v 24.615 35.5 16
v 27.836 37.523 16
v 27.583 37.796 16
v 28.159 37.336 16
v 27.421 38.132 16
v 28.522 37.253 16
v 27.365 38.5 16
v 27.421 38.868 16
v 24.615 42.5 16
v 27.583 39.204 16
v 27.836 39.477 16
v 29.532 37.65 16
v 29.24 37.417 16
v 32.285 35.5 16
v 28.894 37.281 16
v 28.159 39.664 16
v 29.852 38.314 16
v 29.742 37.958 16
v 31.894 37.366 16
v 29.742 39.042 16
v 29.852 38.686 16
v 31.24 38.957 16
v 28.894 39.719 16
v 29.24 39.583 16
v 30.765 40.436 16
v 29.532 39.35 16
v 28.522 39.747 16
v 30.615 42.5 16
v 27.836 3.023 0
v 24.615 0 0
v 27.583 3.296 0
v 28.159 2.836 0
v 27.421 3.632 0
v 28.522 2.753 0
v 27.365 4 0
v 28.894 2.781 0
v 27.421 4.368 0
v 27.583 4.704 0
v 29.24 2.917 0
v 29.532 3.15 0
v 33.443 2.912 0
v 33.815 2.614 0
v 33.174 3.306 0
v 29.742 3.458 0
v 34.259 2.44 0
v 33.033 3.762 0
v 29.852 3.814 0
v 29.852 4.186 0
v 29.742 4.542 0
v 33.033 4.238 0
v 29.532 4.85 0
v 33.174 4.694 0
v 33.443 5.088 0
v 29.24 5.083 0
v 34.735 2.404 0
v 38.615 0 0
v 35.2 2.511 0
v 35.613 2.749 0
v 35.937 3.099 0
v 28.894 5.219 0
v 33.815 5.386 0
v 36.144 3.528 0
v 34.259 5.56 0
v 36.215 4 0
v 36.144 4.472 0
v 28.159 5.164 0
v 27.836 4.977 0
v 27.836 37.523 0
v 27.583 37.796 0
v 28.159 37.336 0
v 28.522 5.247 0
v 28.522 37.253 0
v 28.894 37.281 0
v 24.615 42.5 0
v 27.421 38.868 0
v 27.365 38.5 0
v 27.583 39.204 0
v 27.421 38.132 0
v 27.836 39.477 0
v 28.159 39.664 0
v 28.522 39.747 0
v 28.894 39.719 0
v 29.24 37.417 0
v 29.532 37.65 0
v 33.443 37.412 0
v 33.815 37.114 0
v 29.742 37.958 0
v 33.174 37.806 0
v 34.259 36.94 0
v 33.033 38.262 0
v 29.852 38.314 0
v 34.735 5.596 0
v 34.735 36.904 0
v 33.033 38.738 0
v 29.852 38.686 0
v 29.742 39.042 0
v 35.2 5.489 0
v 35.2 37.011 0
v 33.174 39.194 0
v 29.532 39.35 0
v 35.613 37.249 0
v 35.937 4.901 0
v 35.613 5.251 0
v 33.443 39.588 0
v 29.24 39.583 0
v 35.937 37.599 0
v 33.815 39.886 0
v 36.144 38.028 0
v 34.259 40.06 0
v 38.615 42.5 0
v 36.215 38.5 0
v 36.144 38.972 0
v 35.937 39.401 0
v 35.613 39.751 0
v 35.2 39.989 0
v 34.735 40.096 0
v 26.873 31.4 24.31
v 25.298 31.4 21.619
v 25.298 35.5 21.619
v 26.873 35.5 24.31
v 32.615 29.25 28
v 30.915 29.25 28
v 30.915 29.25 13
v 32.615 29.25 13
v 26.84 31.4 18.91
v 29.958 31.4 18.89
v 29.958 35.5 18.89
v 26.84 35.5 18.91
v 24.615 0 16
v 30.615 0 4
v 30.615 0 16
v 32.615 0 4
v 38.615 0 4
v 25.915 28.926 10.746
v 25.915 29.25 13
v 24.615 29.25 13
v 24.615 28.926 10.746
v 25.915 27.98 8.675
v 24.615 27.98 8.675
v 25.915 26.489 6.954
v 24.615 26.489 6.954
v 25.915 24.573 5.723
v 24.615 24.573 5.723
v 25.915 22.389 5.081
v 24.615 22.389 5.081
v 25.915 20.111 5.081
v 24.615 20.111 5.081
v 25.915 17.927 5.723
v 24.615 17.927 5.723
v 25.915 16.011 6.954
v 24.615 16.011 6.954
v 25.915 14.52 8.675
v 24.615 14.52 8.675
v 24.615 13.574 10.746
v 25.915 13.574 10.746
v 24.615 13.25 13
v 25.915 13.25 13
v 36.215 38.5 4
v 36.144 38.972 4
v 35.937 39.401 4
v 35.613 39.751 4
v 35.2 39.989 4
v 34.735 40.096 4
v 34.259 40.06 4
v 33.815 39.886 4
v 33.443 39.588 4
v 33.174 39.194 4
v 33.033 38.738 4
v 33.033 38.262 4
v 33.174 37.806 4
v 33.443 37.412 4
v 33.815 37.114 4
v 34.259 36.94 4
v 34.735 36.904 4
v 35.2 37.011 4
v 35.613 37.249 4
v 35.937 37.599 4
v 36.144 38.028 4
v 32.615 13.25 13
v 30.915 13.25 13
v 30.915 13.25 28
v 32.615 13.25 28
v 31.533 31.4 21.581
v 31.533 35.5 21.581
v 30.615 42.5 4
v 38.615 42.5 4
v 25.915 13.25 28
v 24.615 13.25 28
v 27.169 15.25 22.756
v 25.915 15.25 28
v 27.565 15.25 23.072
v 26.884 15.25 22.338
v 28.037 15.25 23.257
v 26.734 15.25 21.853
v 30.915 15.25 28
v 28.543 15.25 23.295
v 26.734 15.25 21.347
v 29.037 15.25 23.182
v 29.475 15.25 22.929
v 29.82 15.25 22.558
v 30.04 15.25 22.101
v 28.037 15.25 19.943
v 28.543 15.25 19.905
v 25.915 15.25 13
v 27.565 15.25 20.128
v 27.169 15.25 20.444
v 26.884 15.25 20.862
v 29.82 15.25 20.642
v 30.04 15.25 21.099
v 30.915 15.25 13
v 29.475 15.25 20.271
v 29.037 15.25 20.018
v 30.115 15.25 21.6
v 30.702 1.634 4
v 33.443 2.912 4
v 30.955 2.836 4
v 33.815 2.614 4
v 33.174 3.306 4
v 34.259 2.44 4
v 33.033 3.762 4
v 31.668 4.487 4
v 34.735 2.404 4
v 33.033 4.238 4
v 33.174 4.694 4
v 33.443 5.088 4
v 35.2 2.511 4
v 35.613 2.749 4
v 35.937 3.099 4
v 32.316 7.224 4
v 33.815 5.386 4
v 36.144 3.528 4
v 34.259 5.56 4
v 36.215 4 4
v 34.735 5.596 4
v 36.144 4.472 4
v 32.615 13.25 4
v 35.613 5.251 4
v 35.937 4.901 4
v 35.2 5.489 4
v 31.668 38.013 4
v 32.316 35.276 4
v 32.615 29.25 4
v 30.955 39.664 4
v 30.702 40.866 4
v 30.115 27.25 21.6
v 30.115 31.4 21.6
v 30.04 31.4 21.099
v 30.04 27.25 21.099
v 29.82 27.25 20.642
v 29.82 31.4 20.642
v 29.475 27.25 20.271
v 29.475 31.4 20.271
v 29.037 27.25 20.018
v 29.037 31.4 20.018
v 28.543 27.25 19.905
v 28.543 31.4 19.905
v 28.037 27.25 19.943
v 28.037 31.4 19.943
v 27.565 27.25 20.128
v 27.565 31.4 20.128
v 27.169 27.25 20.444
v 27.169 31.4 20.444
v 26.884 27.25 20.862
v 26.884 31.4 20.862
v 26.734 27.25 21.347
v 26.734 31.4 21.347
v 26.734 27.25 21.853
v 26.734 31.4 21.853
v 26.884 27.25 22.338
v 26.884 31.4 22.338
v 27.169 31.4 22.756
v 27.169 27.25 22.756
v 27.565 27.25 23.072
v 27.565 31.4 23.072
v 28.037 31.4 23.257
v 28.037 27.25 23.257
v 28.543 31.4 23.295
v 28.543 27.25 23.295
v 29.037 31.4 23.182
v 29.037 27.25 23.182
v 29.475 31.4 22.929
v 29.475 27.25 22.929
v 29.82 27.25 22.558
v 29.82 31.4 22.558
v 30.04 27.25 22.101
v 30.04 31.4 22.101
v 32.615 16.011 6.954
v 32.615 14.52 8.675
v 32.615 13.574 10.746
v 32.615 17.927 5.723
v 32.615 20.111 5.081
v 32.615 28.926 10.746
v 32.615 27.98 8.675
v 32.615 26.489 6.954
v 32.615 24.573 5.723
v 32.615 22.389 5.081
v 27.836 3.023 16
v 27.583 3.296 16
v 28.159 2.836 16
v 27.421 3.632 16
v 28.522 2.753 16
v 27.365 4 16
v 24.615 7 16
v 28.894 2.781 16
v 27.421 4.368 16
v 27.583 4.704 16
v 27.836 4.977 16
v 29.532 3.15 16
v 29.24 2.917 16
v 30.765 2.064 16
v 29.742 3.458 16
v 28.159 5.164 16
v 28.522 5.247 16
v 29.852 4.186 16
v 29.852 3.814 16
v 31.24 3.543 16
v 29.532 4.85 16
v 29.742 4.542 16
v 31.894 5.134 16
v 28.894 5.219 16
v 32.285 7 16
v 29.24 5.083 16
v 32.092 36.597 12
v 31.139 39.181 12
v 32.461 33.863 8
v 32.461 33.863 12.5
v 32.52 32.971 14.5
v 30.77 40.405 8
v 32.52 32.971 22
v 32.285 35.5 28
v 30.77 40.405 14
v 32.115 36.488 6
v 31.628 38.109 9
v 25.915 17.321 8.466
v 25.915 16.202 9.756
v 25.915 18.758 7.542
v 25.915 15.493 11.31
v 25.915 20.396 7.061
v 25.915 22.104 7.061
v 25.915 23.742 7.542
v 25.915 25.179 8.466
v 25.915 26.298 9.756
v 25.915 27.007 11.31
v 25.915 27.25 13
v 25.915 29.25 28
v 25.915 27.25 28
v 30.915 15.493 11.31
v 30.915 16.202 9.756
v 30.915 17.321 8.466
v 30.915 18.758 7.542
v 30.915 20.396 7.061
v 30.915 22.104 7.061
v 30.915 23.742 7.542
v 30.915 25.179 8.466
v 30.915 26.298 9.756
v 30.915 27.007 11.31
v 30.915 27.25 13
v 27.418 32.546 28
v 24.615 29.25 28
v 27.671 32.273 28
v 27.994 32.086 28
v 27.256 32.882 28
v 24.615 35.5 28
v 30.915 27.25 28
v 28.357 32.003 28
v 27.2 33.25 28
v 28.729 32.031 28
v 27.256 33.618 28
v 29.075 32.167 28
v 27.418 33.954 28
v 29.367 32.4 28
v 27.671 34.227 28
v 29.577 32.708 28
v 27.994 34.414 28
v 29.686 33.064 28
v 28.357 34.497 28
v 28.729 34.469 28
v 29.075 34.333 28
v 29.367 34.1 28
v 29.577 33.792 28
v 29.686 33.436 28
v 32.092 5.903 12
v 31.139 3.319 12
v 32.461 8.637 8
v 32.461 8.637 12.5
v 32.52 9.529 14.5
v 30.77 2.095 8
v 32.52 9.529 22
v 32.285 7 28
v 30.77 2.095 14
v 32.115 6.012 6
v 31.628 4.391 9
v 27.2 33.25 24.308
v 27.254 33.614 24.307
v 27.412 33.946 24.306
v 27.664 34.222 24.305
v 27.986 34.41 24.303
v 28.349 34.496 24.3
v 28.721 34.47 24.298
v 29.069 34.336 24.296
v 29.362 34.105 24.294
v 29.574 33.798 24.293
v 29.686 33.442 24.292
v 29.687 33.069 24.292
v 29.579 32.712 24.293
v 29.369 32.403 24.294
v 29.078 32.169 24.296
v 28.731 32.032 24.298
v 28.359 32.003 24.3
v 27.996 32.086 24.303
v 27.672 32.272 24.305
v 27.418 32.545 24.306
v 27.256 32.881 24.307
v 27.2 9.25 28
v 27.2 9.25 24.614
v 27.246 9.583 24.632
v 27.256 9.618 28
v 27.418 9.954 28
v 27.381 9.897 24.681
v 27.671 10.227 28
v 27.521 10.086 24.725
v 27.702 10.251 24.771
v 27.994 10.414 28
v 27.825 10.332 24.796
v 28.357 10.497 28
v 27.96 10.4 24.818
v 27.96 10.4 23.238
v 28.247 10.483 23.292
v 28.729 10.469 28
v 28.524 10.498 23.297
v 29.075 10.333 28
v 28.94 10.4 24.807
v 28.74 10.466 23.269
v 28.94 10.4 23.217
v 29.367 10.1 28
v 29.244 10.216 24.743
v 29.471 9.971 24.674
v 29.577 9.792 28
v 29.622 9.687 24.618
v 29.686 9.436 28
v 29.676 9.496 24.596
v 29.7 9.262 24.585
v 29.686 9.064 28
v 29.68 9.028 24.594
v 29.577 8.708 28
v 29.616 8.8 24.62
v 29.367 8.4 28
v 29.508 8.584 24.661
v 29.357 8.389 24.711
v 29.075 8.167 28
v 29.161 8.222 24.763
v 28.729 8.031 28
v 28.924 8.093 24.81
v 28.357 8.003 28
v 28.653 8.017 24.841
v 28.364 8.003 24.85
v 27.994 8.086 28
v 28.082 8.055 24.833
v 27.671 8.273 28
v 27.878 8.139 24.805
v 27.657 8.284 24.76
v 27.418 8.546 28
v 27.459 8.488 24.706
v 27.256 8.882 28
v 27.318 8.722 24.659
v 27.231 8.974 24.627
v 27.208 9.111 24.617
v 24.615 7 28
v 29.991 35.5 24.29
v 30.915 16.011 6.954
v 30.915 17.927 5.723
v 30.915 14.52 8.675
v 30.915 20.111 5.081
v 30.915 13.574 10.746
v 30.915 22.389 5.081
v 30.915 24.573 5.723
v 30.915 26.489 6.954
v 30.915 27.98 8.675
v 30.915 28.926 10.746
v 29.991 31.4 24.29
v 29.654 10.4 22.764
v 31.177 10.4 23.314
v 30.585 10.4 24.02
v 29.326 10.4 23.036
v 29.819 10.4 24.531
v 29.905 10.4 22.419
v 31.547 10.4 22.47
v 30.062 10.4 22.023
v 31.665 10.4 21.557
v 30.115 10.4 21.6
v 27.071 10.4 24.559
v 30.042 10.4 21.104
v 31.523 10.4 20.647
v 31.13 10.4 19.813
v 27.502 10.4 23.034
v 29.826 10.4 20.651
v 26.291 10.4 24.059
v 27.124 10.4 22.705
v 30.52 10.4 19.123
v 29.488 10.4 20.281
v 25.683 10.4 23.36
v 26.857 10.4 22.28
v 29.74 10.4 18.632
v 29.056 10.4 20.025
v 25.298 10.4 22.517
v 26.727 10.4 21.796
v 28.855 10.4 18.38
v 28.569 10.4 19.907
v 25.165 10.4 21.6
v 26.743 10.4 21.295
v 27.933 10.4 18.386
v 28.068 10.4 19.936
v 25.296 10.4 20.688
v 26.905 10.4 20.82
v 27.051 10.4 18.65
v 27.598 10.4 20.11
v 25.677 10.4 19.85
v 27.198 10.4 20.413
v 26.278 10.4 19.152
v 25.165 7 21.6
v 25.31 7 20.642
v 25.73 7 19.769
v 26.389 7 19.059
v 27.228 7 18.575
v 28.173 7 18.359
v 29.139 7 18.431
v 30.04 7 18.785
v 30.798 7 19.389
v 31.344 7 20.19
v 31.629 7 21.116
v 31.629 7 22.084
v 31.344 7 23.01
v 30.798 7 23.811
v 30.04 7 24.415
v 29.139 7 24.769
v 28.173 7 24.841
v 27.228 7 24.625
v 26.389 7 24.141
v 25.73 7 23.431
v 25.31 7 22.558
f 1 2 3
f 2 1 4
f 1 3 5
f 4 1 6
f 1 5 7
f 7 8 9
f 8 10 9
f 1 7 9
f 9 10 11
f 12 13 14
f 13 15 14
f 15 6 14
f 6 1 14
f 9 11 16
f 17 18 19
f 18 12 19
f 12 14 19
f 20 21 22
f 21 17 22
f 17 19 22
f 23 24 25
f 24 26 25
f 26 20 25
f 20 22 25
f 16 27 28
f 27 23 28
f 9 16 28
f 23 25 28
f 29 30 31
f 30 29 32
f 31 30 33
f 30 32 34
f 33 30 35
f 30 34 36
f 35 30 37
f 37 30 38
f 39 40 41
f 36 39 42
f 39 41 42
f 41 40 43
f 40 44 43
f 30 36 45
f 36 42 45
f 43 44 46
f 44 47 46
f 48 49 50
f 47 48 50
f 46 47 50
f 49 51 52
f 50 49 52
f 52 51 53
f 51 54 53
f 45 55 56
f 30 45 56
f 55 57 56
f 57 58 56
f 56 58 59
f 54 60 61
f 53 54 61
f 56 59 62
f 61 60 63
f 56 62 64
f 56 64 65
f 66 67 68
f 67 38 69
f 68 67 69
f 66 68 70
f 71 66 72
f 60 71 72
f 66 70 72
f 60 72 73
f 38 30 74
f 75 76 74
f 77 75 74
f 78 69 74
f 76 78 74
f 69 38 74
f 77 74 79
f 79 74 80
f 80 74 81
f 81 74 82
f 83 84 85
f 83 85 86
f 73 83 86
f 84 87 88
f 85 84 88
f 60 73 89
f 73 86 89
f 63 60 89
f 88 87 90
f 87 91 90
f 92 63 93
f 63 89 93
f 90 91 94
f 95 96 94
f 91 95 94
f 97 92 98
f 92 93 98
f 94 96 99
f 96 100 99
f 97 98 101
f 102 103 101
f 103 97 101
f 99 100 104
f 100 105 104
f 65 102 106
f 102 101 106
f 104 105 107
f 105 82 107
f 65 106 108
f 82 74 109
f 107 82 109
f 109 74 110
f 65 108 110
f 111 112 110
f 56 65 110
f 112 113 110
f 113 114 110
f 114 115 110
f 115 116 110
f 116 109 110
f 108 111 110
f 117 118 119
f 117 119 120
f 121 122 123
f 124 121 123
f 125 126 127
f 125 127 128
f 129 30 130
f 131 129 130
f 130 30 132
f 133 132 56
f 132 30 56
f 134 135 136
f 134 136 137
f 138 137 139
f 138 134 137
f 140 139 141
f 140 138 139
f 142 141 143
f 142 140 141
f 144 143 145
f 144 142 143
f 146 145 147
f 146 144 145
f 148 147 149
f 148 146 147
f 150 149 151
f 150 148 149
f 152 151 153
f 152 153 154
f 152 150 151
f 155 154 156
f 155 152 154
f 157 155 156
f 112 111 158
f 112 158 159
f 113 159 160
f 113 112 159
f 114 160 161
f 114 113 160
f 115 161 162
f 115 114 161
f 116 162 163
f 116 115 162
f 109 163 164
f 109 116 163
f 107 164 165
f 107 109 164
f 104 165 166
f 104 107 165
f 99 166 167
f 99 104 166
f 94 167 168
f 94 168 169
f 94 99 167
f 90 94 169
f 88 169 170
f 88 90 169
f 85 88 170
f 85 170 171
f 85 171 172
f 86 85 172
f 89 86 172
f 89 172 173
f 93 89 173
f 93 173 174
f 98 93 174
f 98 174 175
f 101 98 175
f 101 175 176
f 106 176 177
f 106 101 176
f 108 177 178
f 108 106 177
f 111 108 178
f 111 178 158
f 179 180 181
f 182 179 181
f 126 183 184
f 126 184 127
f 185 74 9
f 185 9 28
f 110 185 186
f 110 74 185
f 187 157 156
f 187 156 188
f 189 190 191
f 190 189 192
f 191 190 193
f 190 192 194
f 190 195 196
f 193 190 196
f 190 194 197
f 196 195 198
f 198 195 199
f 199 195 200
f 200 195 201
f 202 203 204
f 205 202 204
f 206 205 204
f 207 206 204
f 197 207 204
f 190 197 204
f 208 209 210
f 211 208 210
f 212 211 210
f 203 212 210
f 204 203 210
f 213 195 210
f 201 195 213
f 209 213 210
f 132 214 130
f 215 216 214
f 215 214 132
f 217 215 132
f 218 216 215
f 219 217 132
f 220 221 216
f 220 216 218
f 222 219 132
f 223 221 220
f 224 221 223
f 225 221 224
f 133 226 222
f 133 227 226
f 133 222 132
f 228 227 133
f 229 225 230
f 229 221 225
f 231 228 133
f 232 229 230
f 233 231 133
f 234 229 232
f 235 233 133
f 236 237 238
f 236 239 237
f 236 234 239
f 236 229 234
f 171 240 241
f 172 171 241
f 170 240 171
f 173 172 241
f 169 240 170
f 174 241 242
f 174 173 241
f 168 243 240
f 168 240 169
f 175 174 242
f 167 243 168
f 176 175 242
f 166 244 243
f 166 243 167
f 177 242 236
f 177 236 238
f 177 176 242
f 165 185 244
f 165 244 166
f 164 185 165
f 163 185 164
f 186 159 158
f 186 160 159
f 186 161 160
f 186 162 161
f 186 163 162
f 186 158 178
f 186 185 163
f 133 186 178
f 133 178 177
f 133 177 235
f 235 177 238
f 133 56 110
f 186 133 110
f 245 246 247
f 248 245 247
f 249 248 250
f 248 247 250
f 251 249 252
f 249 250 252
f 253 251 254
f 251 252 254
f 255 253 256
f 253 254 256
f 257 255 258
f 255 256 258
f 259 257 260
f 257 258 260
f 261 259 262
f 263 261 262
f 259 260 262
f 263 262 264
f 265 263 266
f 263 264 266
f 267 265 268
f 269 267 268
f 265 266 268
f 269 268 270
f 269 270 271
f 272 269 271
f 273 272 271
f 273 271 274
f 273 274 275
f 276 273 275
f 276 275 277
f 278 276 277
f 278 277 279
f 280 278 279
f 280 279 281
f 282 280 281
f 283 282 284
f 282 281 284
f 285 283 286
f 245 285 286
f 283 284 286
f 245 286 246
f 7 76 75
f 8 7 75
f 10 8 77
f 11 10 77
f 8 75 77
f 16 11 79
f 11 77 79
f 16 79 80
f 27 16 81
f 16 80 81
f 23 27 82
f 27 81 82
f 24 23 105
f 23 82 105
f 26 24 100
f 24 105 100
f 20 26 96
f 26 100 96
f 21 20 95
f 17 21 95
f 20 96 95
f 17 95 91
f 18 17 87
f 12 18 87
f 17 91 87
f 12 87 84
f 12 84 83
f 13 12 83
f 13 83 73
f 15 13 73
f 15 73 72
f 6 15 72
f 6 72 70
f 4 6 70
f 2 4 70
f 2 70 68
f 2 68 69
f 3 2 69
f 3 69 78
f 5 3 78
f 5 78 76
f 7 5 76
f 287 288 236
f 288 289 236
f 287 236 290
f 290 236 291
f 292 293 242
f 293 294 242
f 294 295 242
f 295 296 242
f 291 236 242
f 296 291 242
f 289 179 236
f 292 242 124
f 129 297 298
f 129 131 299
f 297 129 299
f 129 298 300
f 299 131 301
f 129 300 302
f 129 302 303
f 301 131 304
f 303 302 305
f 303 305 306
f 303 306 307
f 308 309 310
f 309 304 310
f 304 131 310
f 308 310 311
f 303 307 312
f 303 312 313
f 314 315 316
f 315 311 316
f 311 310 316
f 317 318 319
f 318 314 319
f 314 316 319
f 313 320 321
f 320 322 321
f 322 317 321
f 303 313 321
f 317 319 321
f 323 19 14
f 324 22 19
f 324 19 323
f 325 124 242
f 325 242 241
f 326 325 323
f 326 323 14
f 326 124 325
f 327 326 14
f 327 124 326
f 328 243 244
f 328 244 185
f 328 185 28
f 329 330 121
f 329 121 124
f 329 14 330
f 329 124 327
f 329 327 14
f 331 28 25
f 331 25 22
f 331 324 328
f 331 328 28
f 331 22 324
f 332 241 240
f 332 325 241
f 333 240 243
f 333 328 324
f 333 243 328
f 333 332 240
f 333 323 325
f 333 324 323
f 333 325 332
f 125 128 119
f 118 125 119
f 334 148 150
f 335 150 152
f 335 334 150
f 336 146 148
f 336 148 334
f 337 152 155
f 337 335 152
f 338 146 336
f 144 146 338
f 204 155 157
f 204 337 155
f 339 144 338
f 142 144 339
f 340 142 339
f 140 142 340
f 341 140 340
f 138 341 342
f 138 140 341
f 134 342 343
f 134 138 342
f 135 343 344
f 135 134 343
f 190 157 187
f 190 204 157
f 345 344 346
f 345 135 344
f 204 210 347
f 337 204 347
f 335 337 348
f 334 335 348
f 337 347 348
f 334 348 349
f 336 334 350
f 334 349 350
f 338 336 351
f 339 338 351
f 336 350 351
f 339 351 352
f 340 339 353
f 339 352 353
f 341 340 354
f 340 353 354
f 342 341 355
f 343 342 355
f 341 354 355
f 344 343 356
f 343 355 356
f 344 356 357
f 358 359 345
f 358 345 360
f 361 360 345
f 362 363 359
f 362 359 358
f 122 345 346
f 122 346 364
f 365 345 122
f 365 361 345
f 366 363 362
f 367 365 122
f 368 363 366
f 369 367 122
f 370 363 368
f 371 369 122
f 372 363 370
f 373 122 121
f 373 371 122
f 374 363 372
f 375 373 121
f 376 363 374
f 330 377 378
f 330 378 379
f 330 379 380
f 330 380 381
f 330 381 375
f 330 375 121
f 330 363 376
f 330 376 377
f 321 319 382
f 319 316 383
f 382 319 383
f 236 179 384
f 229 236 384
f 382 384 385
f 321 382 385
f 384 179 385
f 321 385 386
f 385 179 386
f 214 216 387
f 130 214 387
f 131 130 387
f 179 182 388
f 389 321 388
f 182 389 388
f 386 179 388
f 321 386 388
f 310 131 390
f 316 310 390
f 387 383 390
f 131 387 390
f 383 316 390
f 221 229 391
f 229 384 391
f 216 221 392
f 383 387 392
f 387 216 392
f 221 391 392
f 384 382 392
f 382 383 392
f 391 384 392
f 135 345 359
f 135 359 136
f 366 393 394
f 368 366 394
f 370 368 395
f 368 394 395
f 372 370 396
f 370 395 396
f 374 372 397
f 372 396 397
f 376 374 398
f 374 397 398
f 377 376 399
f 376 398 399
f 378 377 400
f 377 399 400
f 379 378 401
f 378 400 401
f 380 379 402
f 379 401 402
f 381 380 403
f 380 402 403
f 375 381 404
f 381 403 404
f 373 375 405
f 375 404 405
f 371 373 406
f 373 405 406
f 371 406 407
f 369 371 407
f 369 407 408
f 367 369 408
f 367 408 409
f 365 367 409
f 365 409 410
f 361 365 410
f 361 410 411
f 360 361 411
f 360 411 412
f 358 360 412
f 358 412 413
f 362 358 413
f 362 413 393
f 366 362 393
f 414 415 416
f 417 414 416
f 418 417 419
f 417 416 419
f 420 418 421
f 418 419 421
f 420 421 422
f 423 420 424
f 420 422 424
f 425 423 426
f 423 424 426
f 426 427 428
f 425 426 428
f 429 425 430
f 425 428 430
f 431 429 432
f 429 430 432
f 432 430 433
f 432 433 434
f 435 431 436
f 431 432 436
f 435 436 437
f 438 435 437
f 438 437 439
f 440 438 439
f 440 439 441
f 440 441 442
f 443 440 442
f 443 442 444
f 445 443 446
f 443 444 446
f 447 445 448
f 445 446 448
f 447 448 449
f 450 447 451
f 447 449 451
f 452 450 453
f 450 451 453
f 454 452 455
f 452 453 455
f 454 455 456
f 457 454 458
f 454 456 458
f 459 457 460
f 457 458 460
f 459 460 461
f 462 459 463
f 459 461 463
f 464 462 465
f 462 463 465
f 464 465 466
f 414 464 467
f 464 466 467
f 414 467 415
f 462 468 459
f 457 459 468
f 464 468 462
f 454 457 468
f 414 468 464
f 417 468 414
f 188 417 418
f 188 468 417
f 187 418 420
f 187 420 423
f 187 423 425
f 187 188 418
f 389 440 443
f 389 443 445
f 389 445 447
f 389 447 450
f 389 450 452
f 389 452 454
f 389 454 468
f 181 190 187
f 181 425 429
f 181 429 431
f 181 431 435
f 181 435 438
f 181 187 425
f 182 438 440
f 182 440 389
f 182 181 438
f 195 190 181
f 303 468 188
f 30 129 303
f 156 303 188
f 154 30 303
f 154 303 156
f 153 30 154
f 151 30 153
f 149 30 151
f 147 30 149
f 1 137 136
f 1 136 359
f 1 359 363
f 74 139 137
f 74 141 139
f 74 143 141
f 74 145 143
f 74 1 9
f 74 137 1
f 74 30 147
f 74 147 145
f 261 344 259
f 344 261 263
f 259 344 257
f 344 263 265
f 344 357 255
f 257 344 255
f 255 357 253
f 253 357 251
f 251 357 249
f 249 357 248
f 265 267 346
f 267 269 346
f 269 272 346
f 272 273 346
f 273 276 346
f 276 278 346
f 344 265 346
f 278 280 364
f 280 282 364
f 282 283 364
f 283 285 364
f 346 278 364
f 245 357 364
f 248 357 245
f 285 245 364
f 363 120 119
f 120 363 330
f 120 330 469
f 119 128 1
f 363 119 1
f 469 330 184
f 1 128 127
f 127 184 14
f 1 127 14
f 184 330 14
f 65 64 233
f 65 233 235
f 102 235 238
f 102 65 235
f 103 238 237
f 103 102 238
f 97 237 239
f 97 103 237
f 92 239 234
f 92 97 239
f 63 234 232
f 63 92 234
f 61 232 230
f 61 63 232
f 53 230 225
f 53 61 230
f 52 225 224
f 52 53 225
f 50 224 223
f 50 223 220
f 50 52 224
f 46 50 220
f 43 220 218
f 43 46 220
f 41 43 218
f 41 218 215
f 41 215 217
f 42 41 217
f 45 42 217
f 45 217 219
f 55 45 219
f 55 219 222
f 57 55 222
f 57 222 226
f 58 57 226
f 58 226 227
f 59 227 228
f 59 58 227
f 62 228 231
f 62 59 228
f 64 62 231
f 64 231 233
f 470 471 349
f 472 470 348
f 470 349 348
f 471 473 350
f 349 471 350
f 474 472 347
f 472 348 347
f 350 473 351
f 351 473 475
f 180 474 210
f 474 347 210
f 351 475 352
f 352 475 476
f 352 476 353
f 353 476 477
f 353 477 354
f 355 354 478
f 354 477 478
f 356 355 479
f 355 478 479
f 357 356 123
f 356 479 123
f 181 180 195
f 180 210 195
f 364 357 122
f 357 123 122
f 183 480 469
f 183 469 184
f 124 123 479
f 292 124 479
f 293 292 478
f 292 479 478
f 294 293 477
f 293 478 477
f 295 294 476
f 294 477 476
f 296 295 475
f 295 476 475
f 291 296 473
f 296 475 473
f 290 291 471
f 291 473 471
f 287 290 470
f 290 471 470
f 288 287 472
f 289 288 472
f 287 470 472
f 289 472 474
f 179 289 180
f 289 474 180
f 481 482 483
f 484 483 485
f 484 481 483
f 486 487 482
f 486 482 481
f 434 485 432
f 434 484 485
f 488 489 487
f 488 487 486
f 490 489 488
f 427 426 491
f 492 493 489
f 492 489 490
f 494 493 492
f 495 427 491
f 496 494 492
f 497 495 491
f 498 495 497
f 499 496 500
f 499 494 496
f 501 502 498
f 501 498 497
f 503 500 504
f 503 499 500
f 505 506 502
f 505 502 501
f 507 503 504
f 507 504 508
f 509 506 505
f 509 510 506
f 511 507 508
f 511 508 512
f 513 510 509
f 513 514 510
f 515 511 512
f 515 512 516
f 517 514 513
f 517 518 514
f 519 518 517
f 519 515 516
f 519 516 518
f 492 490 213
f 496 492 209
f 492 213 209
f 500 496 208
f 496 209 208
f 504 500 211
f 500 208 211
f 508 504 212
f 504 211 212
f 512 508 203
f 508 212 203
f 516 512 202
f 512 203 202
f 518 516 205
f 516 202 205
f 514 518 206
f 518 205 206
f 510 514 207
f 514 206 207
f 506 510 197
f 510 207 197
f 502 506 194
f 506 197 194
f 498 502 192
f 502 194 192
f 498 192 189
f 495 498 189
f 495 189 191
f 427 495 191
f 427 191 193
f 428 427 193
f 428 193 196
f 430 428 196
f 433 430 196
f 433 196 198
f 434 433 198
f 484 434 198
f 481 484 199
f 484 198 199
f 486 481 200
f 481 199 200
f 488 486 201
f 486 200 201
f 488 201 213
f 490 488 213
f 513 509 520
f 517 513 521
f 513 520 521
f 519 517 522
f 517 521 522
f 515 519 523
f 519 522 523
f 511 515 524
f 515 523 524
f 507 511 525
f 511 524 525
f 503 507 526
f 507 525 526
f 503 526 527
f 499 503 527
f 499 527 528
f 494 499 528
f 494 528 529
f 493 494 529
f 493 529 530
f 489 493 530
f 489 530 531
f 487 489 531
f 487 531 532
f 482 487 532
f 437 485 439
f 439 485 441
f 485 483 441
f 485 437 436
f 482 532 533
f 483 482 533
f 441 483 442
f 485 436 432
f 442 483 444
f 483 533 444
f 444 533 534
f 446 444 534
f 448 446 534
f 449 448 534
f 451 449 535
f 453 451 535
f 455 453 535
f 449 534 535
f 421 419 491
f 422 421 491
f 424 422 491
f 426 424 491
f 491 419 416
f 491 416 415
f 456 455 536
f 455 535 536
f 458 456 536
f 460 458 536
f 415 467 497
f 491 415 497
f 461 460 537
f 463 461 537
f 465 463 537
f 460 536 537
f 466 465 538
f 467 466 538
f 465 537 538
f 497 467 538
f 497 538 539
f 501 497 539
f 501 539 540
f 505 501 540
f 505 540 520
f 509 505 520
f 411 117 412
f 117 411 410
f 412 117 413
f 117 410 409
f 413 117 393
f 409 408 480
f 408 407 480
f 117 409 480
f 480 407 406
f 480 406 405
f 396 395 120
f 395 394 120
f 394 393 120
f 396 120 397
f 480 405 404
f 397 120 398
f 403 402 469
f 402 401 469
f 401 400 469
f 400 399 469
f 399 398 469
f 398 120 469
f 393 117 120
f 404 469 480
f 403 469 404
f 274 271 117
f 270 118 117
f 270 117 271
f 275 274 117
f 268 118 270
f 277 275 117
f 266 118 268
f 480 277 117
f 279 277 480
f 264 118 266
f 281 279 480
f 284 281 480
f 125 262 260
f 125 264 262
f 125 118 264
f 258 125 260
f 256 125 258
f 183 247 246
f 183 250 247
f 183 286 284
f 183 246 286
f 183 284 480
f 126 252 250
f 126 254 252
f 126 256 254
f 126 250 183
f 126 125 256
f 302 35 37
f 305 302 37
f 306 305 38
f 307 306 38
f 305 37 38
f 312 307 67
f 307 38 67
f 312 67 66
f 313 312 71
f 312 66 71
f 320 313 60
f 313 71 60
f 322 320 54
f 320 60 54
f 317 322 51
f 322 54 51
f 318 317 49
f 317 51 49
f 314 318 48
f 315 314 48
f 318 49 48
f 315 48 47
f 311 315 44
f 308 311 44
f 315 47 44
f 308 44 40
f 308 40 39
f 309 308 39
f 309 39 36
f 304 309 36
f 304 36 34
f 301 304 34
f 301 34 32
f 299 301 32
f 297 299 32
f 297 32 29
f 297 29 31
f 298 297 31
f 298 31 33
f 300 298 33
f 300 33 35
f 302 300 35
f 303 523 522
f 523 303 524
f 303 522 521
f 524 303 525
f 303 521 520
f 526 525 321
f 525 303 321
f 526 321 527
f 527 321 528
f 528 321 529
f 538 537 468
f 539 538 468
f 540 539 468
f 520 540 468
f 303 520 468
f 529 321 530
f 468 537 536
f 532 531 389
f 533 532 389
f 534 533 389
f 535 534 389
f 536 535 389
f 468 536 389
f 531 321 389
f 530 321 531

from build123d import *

# Parameters (mm, degrees)
ESQUISSE1_W                                        = 14
ESQUISSE1_H                                        = 42.5
ESQUISSE1_R                                        = 1.6
BOSS_EXTRU_1_DEPTH                                 = 4
ESQUISSE2_W                                        = 8
ESQUISSE2_H                                        = 42.5
BOSS_EXTRU_2_DEPTH                                 = 24
ENL_V_MAT_EXTRU_1_DEPTH                            = 9
ENL_V_START                                        = -1.7
ENL_V_MAT_EXTRU_3_DEPTH                            = 1.7
ENL_V_START_2                                      = -1.3
ENL_V_MAT_EXTRU_4_DEPTH                            = 1.3
ESQUISSE6_W                                        = 12
ESQUISSE6_H                                        = 7
ENL_V_MAT_EXTRU_2_DEPTH                            = 9
CHAMBRAGE_POUR_VIS_T_TE_HEXAGONALE_M31_D           = 3.4
CHAMBRAGE_POUR_VIS_T_TE_HEXAGONALE_M31_DEPTH       = 30
CHAMBRAGE_POUR_VIS_T_TE_HEXAGONALE_M31_CBORE_D     = 6.5
CHAMBRAGE_POUR_VIS_T_TE_HEXAGONALE_M31_CBORE_DEPTH = 3.4
CHAMBRAGE_POUR_VIS_T_TE_HEXAGONALE_M31_TIP         = 1.021463052
TROU_POUR_TARAUDAGE_POUR_TROU_TARAUD_M3_D          = 2.5
TROU_POUR_TARAUDAGE_POUR_TROU_TARAUD_M3_DEPTH      = 34.5
ENL_V_MAT_EXTRU_5_DEPTH                            = 4.1
ENL_V_MAT_EXTRU_6_DEPTH                            = 24
TROU_POUR_TARAUDAGE_POUR_TROU_TARAUD_2_D           = 2.5
TROU_POUR_TARAUDAGE_POUR_TROU_TARAUD_2_DEPTH       = 5


with BuildPart() as part:
    # Esquisse1 → Boss.-Extru.1 (new body)
    with BuildSketch(Plane.XY):
        with Locations((31.615489842, 21.249999998)):
            Rectangle(ESQUISSE1_W, ESQUISSE1_H)
        with Locations((34.615489842, 3.999999998)):
            Circle(ESQUISSE1_R, mode=Mode.SUBTRACT)
        with Locations((34.615489842, 38.499999998)):
            Circle(ESQUISSE1_R, mode=Mode.SUBTRACT)
    extrude(amount=BOSS_EXTRU_1_DEPTH)

    # Esquisse2 → Boss.-Extru.2 (add)
    with BuildSketch(Plane.XY.offset(4)):
        with Locations((28.615489842, 21.249999998)):
            Rectangle(ESQUISSE2_W, ESQUISSE2_H)
    extrude(amount=BOSS_EXTRU_2_DEPTH)

    # Esquisse3 → Enlèv. mat.-Extru.1 (cut, through all)
    with BuildSketch(Plane(origin=(32.615489842, 0, 0), x_dir=(0, 0, -1), z_dir=(1, 0, 0))):
        with BuildLine():
            Line((-13, 27.250000778), (-28, 27.250000778))
            Line((-28, 27.250000778), (-28, 15.250000778))
            Line((-28, 15.250000778), (-13, 15.250000778))
            ThreePointArc((-13, 15.250000778), (-7, 21.250000778), (-13, 27.250000778))
        make_face()
    extrude(amount=-ENL_V_MAT_EXTRU_1_DEPTH, mode=Mode.SUBTRACT)

    # Esquisse7 → Enlèv. mat.-Extru.3 (cut)
    with BuildSketch(Plane(origin=(32.615489842, 0, 0), x_dir=(0, 0, -1), z_dir=(1, 0, 0)).offset(ENL_V_START)):
        with BuildLine():
            Line((-13, 13.250000429), (-28, 13.250000429))
            Line((-28, 13.250000429), (-28, 29.250000429))
            Line((-28, 29.250000429), (-13, 29.250000429))
            ThreePointArc((-13, 29.250000429), (-5, 21.250000429), (-13, 13.250000429))
        make_face()
    extrude(amount=ENL_V_MAT_EXTRU_3_DEPTH, mode=Mode.SUBTRACT)

    # Esquisse8 → Enlèv. mat.-Extru.4 (cut)
    with BuildSketch(Plane.ZY.offset(-24.615489842).offset(ENL_V_START_2)):
        with BuildLine():
            Line((13, 13.250000429), (28, 13.250000429))
            Line((28, 13.250000429), (28, 29.250000429))
            Line((28, 29.250000429), (13, 29.250000429))
            ThreePointArc((13, 29.250000429), (5, 21.250000429), (13, 13.250000429))
        make_face()
    extrude(amount=ENL_V_MAT_EXTRU_4_DEPTH, mode=Mode.SUBTRACT)

    # Esquisse6 → Enlèv. mat.-Extru.2 (cut, through all)
    with BuildSketch(Plane(origin=(32.615489842, 0, 0), x_dir=(0, 0, -1), z_dir=(1, 0, 0))):
        with Locations((-22, 38.999999998)):
            Rectangle(ESQUISSE6_W, ESQUISSE6_H)
        Polygon((-28, -2e-09), (-16, 0), (-16, 7), (-28, 7), align=None)
    extrude(amount=-ENL_V_MAT_EXTRU_2_DEPTH, mode=Mode.SUBTRACT)

    # Chambrage pour vis à tête hexagonale M31
    with Locations(Plane(origin=(0, 7, 0), x_dir=(-1, 0, 0), z_dir=(0, -1, 0))):
        with Locations((-28.415489842, -21.6)):
            CounterBoreHole(CHAMBRAGE_POUR_VIS_T_TE_HEXAGONALE_M31_D / 2, CHAMBRAGE_POUR_VIS_T_TE_HEXAGONALE_M31_CBORE_D / 2, CHAMBRAGE_POUR_VIS_T_TE_HEXAGONALE_M31_CBORE_DEPTH, depth=CHAMBRAGE_POUR_VIS_T_TE_HEXAGONALE_M31_DEPTH)
            with Locations((0, 0, -(CHAMBRAGE_POUR_VIS_T_TE_HEXAGONALE_M31_DEPTH + CHAMBRAGE_POUR_VIS_T_TE_HEXAGONALE_M31_TIP / 2))):  # 118° drill point
                Cone(0, CHAMBRAGE_POUR_VIS_T_TE_HEXAGONALE_M31_D / 2, CHAMBRAGE_POUR_VIS_T_TE_HEXAGONALE_M31_TIP, mode=Mode.SUBTRACT)

    # Trou pour taraudage pour trou taraud_ M3
    with Locations(Plane.XY.offset(16)):
        with Locations((28.615489842, 4), (28.615489842, 38.499999998)):
            Hole(TROU_POUR_TARAUDAGE_POUR_TROU_TARAUD_M3_D / 2, depth=TROU_POUR_TARAUDAGE_POUR_TROU_TARAUD_M3_DEPTH)

    # Esquisse15 → Enlèv. mat.-Extru.5 (cut)
    with BuildSketch(Plane(origin=(0, 35.499999998, 0), x_dir=(1, 0, 0), z_dir=(0, 1, 0))):
        Polygon((25.297858374, -21.619339993), (26.873423034, -24.309618047), (29.991054501, -24.290278053), (31.533121309, -21.580660007), (29.95755665, -18.890381953), (26.839925183, -18.909721947), align=None)
    extrude(amount=-ENL_V_MAT_EXTRU_5_DEPTH, mode=Mode.SUBTRACT)

    # Esquisse16 → Enlèv. mat.-Extru.6 (cut)
    with BuildSketch(Plane.XY.offset(28)):
        with BuildLine():
            Line((30.615489842, 0), (32.615489842, -2e-09))
            Line((32.615489842, -2e-09), (32.615489842, 13.250000429))
            add(Edge.make_bspline(
                [(32.615489842, 13.250000429), (32.591528482, 1.687598594), (30.638844219, 5.520365059), (30.615489842, 0)],
                knots=[0, 0, 0, 0, 1, 1, 1, 1], degree=3))
        make_face()
        with BuildLine():
            Line((30.615489842, 42.500000857), (32.615489842, 42.50000086))
            Line((32.615489842, 42.50000086), (32.615489842, 29.250000429))
            add(Edge.make_bspline(
                [(32.615489842, 29.250000429), (32.591528482, 40.812402263), (30.638844219, 36.979635798), (30.615489842, 42.500000857)],
                knots=[0, 0, 0, 0, 1, 1, 1, 1], degree=3))
        make_face()
    extrude(amount=-ENL_V_MAT_EXTRU_6_DEPTH, mode=Mode.SUBTRACT)

    # Trou pour taraudage pour trou taraud 2
    with Locations(Plane.XY.offset(28)):
        with Locations((28.450357355, 33.249999999), (28.450357355, 9.249999999)):
            Hole(TROU_POUR_TARAUDAGE_POUR_TROU_TARAUD_2_D / 2, depth=TROU_POUR_TARAUDAGE_POUR_TROU_TARAUD_2_DEPTH)


solid = part.part
